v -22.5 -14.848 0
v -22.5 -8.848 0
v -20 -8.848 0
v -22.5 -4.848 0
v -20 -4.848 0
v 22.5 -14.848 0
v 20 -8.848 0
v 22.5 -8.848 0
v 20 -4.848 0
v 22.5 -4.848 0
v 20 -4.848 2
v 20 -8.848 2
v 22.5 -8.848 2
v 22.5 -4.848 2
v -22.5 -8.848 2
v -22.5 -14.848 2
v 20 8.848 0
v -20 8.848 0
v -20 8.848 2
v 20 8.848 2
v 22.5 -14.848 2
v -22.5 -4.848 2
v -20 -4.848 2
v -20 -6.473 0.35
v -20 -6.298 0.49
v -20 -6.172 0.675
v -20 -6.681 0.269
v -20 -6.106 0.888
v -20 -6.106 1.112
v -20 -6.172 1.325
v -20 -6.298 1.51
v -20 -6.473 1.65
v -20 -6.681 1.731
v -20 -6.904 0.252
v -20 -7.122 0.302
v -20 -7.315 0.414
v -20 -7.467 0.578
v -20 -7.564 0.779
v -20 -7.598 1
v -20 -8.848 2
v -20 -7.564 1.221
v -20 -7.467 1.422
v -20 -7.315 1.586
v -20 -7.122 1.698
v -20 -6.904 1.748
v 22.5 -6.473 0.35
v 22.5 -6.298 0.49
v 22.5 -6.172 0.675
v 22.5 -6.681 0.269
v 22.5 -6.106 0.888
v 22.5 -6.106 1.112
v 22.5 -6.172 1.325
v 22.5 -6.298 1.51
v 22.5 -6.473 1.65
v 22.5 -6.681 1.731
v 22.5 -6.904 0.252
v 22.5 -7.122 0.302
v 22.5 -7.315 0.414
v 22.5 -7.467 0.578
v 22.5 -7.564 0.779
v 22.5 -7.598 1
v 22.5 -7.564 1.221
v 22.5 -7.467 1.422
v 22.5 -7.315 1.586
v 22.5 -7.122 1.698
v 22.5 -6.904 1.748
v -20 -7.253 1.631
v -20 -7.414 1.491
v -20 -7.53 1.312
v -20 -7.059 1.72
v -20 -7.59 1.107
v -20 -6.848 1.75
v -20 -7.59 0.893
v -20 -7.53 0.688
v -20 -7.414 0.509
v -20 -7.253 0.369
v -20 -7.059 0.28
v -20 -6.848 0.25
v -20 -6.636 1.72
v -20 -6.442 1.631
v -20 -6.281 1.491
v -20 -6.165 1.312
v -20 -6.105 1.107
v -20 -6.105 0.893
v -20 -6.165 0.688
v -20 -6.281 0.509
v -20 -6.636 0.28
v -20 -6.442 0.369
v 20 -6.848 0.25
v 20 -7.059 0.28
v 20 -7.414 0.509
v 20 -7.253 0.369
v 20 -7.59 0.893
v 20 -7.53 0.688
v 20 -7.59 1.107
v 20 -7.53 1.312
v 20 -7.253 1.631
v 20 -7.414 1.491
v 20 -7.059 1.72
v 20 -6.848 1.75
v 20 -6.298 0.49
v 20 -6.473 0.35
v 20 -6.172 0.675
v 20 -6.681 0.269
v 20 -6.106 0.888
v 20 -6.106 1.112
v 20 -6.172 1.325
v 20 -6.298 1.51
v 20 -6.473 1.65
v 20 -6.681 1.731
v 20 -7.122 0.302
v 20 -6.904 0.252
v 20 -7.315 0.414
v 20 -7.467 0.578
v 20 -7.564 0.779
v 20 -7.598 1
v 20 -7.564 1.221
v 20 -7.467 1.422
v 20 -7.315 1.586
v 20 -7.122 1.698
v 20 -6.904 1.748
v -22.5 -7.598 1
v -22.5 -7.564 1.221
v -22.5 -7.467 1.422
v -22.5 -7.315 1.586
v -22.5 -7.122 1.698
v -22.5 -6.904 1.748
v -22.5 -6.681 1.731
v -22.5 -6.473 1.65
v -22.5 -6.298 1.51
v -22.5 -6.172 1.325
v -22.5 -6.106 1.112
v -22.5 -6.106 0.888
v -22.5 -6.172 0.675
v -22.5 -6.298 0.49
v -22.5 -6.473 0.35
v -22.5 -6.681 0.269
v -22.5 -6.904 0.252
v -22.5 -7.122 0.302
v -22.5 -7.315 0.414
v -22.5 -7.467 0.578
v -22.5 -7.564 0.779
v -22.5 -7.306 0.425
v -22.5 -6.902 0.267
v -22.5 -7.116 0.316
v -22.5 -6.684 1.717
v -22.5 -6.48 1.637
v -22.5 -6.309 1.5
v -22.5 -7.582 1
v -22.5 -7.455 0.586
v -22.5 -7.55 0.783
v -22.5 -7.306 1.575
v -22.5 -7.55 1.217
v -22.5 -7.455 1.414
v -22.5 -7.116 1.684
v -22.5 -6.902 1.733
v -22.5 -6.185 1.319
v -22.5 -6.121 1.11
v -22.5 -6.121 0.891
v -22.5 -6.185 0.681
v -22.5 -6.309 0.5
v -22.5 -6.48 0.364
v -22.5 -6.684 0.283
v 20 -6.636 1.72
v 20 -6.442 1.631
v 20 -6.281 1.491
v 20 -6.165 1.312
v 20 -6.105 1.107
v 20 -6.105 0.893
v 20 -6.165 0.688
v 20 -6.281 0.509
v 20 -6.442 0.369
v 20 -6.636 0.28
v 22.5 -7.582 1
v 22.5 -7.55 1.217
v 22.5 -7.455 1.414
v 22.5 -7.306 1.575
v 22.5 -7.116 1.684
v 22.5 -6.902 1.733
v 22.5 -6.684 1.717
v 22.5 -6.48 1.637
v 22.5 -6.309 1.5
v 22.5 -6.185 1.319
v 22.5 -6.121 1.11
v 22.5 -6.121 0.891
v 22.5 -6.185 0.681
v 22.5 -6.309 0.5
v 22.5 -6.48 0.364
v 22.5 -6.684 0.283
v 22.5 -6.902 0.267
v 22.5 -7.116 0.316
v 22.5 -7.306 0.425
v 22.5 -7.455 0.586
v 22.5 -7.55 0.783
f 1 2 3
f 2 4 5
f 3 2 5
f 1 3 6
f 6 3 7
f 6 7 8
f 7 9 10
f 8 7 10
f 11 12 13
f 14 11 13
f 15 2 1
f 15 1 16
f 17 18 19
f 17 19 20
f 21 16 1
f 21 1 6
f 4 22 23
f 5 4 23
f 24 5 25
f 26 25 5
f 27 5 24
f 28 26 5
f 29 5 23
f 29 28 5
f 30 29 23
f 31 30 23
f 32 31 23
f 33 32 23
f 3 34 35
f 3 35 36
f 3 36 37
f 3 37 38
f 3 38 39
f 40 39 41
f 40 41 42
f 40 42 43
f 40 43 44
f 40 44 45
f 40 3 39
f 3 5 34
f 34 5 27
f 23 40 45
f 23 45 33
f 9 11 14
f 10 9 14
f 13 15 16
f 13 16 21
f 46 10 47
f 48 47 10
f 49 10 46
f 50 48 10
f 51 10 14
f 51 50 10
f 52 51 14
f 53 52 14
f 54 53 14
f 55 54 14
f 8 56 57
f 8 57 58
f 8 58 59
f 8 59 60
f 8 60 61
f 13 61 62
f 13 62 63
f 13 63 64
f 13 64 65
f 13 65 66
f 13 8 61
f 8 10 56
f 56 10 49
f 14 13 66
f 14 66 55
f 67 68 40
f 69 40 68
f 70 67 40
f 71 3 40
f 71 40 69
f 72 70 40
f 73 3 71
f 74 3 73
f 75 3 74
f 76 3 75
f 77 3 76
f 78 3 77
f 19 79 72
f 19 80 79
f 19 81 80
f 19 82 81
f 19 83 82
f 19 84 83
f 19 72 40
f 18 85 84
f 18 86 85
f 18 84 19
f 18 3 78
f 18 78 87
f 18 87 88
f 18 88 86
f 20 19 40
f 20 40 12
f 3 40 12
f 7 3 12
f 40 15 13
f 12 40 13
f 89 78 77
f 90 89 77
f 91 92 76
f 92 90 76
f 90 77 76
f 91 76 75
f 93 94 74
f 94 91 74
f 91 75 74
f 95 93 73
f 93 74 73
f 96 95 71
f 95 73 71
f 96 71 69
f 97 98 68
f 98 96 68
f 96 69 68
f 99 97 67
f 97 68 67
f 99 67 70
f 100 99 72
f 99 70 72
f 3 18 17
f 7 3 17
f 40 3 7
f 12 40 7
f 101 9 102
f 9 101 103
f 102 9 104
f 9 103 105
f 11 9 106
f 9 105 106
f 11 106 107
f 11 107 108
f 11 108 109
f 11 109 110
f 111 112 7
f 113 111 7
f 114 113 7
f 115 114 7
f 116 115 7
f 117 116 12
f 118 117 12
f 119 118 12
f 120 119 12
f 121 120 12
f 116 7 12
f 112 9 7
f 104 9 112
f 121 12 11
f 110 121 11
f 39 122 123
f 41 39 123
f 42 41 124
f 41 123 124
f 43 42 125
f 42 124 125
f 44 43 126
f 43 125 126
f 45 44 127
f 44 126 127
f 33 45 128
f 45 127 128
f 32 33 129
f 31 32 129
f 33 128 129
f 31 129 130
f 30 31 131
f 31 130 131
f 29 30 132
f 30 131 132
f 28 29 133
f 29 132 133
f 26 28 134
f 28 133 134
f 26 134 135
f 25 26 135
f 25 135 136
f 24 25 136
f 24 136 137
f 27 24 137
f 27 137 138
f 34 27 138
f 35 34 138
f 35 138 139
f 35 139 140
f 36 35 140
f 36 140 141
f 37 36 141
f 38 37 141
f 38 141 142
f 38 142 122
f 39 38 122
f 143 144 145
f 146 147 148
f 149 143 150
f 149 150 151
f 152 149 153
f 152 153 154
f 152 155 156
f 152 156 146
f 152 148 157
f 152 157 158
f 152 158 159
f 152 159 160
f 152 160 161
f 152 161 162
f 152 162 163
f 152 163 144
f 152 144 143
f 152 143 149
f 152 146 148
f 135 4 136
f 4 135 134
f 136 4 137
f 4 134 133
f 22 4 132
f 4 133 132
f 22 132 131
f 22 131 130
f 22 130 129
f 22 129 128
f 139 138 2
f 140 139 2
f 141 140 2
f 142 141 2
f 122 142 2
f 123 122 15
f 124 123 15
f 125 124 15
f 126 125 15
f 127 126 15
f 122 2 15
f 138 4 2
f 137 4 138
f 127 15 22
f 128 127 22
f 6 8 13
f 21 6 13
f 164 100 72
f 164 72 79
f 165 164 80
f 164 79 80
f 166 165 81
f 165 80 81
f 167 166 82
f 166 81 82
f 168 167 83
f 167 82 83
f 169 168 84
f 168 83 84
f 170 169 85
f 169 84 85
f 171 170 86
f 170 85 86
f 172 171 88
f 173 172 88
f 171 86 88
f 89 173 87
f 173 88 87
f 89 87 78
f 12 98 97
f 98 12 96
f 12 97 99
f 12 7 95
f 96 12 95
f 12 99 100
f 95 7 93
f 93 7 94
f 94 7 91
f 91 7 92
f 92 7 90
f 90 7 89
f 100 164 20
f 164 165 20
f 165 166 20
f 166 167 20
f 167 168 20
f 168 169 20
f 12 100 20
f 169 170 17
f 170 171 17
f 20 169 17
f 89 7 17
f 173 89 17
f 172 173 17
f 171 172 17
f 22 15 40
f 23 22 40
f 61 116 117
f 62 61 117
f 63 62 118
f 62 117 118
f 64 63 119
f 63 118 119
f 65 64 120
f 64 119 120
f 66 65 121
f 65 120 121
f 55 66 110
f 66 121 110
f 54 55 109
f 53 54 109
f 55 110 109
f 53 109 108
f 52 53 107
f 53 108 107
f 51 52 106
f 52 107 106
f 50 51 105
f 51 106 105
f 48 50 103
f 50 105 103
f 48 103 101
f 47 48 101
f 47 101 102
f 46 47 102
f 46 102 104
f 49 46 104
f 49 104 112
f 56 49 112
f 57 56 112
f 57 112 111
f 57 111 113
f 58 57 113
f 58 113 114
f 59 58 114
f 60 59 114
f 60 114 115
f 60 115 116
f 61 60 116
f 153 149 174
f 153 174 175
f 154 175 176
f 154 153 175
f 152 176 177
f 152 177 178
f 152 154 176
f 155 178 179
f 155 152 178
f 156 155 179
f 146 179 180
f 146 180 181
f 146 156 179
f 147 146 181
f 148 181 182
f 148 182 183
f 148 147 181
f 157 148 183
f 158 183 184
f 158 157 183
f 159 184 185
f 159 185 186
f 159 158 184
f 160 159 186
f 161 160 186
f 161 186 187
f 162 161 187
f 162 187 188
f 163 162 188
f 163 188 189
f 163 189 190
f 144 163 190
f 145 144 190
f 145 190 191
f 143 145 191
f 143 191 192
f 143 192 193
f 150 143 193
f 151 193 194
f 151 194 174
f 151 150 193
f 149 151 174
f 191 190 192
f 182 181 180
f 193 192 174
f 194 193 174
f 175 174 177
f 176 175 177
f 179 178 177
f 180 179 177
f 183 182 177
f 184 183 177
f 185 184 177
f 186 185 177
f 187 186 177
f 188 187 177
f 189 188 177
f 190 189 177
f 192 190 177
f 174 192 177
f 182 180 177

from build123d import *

# Parameters (mm, degrees)
F0_W      = 40
F0_H      = 17.6951652771
F1_DEPTH  = 2
F4_W      = 45.0000986457
F4_H      = 2.0004236139
F5_DEPTH  = 6
F2_W      = 2.5
F2_H      = 2
F6_DEPTH  = 4
F7_R      = 0.75
F8_DEPTH  = 45
F9_R      = 0.75
F10_DEPTH = 40
F11_R     = 0.735
F12_DEPTH = 45


with BuildPart() as f1:
    # F0 (on Top) → F1 (new body)
    with BuildSketch(Plane.XY):
        Rectangle(F0_W, F0_H)
    extrude(amount=F1_DEPTH)


with BuildPart() as f5:
    # F4 (on offset) → F5 (new body)
    with BuildSketch(Plane.XZ.offset(8.8475826385)):
        with Locations((-2.23517e-05, 1.000211807)):
            Rectangle(F4_W, F4_H)
    extrude(amount=F5_DEPTH)

    # F2 (on face) → F6 (join)
    with BuildSketch(Plane.XZ.offset(8.8475826385)):
        with Locations((-21.25, 1)):
            Rectangle(F2_W, F2_H)
        with Locations((21.25, 1)):
            Rectangle(F2_W, F2_H)
    extrude(amount=-F6_DEPTH)


with BuildPart() as f8_tool:
    # F7 (on face) → F8 (new body)
    with BuildSketch(Plane(origin=(-22.5, 0, 0), x_dir=(0, -1, 0), z_dir=(-1, 0, 0))):
        with Locations((6.8475826385, 1)):
            Circle(F7_R)
    extrude(amount=-F8_DEPTH)


with BuildPart() as f1_1:
    add(f1.part)

    # F8: cut by f8_tool
    add(f8_tool.part, mode=Mode.SUBTRACT)

    # F9 (on face) → F10 (cut)
    with BuildSketch(Plane(origin=(-20, 0, 0), x_dir=(0, -1, 0), z_dir=(-1, 0, 0))):
        with Locations((6.8475373649, 1)):
            Circle(F9_R)
    extrude(amount=-F10_DEPTH, mode=Mode.SUBTRACT)


with BuildPart() as f5_1:
    add(f5.part)

    # F8: cut by f8_tool
    add(f8_tool.part, mode=Mode.SUBTRACT)


with BuildPart() as f12:
    # F11 (on face) → F12 (new body)
    with BuildSketch(Plane(origin=(-22.5, 0, 0), x_dir=(0, -1, 0), z_dir=(-1, 0, 0))):
        with Locations((6.8474767406, 1.0000529489)):
            Circle(F11_R)
    extrude(amount=-F12_DEPTH)


solid = Compound([f1_1.part, f5_1.part, f12.part])
